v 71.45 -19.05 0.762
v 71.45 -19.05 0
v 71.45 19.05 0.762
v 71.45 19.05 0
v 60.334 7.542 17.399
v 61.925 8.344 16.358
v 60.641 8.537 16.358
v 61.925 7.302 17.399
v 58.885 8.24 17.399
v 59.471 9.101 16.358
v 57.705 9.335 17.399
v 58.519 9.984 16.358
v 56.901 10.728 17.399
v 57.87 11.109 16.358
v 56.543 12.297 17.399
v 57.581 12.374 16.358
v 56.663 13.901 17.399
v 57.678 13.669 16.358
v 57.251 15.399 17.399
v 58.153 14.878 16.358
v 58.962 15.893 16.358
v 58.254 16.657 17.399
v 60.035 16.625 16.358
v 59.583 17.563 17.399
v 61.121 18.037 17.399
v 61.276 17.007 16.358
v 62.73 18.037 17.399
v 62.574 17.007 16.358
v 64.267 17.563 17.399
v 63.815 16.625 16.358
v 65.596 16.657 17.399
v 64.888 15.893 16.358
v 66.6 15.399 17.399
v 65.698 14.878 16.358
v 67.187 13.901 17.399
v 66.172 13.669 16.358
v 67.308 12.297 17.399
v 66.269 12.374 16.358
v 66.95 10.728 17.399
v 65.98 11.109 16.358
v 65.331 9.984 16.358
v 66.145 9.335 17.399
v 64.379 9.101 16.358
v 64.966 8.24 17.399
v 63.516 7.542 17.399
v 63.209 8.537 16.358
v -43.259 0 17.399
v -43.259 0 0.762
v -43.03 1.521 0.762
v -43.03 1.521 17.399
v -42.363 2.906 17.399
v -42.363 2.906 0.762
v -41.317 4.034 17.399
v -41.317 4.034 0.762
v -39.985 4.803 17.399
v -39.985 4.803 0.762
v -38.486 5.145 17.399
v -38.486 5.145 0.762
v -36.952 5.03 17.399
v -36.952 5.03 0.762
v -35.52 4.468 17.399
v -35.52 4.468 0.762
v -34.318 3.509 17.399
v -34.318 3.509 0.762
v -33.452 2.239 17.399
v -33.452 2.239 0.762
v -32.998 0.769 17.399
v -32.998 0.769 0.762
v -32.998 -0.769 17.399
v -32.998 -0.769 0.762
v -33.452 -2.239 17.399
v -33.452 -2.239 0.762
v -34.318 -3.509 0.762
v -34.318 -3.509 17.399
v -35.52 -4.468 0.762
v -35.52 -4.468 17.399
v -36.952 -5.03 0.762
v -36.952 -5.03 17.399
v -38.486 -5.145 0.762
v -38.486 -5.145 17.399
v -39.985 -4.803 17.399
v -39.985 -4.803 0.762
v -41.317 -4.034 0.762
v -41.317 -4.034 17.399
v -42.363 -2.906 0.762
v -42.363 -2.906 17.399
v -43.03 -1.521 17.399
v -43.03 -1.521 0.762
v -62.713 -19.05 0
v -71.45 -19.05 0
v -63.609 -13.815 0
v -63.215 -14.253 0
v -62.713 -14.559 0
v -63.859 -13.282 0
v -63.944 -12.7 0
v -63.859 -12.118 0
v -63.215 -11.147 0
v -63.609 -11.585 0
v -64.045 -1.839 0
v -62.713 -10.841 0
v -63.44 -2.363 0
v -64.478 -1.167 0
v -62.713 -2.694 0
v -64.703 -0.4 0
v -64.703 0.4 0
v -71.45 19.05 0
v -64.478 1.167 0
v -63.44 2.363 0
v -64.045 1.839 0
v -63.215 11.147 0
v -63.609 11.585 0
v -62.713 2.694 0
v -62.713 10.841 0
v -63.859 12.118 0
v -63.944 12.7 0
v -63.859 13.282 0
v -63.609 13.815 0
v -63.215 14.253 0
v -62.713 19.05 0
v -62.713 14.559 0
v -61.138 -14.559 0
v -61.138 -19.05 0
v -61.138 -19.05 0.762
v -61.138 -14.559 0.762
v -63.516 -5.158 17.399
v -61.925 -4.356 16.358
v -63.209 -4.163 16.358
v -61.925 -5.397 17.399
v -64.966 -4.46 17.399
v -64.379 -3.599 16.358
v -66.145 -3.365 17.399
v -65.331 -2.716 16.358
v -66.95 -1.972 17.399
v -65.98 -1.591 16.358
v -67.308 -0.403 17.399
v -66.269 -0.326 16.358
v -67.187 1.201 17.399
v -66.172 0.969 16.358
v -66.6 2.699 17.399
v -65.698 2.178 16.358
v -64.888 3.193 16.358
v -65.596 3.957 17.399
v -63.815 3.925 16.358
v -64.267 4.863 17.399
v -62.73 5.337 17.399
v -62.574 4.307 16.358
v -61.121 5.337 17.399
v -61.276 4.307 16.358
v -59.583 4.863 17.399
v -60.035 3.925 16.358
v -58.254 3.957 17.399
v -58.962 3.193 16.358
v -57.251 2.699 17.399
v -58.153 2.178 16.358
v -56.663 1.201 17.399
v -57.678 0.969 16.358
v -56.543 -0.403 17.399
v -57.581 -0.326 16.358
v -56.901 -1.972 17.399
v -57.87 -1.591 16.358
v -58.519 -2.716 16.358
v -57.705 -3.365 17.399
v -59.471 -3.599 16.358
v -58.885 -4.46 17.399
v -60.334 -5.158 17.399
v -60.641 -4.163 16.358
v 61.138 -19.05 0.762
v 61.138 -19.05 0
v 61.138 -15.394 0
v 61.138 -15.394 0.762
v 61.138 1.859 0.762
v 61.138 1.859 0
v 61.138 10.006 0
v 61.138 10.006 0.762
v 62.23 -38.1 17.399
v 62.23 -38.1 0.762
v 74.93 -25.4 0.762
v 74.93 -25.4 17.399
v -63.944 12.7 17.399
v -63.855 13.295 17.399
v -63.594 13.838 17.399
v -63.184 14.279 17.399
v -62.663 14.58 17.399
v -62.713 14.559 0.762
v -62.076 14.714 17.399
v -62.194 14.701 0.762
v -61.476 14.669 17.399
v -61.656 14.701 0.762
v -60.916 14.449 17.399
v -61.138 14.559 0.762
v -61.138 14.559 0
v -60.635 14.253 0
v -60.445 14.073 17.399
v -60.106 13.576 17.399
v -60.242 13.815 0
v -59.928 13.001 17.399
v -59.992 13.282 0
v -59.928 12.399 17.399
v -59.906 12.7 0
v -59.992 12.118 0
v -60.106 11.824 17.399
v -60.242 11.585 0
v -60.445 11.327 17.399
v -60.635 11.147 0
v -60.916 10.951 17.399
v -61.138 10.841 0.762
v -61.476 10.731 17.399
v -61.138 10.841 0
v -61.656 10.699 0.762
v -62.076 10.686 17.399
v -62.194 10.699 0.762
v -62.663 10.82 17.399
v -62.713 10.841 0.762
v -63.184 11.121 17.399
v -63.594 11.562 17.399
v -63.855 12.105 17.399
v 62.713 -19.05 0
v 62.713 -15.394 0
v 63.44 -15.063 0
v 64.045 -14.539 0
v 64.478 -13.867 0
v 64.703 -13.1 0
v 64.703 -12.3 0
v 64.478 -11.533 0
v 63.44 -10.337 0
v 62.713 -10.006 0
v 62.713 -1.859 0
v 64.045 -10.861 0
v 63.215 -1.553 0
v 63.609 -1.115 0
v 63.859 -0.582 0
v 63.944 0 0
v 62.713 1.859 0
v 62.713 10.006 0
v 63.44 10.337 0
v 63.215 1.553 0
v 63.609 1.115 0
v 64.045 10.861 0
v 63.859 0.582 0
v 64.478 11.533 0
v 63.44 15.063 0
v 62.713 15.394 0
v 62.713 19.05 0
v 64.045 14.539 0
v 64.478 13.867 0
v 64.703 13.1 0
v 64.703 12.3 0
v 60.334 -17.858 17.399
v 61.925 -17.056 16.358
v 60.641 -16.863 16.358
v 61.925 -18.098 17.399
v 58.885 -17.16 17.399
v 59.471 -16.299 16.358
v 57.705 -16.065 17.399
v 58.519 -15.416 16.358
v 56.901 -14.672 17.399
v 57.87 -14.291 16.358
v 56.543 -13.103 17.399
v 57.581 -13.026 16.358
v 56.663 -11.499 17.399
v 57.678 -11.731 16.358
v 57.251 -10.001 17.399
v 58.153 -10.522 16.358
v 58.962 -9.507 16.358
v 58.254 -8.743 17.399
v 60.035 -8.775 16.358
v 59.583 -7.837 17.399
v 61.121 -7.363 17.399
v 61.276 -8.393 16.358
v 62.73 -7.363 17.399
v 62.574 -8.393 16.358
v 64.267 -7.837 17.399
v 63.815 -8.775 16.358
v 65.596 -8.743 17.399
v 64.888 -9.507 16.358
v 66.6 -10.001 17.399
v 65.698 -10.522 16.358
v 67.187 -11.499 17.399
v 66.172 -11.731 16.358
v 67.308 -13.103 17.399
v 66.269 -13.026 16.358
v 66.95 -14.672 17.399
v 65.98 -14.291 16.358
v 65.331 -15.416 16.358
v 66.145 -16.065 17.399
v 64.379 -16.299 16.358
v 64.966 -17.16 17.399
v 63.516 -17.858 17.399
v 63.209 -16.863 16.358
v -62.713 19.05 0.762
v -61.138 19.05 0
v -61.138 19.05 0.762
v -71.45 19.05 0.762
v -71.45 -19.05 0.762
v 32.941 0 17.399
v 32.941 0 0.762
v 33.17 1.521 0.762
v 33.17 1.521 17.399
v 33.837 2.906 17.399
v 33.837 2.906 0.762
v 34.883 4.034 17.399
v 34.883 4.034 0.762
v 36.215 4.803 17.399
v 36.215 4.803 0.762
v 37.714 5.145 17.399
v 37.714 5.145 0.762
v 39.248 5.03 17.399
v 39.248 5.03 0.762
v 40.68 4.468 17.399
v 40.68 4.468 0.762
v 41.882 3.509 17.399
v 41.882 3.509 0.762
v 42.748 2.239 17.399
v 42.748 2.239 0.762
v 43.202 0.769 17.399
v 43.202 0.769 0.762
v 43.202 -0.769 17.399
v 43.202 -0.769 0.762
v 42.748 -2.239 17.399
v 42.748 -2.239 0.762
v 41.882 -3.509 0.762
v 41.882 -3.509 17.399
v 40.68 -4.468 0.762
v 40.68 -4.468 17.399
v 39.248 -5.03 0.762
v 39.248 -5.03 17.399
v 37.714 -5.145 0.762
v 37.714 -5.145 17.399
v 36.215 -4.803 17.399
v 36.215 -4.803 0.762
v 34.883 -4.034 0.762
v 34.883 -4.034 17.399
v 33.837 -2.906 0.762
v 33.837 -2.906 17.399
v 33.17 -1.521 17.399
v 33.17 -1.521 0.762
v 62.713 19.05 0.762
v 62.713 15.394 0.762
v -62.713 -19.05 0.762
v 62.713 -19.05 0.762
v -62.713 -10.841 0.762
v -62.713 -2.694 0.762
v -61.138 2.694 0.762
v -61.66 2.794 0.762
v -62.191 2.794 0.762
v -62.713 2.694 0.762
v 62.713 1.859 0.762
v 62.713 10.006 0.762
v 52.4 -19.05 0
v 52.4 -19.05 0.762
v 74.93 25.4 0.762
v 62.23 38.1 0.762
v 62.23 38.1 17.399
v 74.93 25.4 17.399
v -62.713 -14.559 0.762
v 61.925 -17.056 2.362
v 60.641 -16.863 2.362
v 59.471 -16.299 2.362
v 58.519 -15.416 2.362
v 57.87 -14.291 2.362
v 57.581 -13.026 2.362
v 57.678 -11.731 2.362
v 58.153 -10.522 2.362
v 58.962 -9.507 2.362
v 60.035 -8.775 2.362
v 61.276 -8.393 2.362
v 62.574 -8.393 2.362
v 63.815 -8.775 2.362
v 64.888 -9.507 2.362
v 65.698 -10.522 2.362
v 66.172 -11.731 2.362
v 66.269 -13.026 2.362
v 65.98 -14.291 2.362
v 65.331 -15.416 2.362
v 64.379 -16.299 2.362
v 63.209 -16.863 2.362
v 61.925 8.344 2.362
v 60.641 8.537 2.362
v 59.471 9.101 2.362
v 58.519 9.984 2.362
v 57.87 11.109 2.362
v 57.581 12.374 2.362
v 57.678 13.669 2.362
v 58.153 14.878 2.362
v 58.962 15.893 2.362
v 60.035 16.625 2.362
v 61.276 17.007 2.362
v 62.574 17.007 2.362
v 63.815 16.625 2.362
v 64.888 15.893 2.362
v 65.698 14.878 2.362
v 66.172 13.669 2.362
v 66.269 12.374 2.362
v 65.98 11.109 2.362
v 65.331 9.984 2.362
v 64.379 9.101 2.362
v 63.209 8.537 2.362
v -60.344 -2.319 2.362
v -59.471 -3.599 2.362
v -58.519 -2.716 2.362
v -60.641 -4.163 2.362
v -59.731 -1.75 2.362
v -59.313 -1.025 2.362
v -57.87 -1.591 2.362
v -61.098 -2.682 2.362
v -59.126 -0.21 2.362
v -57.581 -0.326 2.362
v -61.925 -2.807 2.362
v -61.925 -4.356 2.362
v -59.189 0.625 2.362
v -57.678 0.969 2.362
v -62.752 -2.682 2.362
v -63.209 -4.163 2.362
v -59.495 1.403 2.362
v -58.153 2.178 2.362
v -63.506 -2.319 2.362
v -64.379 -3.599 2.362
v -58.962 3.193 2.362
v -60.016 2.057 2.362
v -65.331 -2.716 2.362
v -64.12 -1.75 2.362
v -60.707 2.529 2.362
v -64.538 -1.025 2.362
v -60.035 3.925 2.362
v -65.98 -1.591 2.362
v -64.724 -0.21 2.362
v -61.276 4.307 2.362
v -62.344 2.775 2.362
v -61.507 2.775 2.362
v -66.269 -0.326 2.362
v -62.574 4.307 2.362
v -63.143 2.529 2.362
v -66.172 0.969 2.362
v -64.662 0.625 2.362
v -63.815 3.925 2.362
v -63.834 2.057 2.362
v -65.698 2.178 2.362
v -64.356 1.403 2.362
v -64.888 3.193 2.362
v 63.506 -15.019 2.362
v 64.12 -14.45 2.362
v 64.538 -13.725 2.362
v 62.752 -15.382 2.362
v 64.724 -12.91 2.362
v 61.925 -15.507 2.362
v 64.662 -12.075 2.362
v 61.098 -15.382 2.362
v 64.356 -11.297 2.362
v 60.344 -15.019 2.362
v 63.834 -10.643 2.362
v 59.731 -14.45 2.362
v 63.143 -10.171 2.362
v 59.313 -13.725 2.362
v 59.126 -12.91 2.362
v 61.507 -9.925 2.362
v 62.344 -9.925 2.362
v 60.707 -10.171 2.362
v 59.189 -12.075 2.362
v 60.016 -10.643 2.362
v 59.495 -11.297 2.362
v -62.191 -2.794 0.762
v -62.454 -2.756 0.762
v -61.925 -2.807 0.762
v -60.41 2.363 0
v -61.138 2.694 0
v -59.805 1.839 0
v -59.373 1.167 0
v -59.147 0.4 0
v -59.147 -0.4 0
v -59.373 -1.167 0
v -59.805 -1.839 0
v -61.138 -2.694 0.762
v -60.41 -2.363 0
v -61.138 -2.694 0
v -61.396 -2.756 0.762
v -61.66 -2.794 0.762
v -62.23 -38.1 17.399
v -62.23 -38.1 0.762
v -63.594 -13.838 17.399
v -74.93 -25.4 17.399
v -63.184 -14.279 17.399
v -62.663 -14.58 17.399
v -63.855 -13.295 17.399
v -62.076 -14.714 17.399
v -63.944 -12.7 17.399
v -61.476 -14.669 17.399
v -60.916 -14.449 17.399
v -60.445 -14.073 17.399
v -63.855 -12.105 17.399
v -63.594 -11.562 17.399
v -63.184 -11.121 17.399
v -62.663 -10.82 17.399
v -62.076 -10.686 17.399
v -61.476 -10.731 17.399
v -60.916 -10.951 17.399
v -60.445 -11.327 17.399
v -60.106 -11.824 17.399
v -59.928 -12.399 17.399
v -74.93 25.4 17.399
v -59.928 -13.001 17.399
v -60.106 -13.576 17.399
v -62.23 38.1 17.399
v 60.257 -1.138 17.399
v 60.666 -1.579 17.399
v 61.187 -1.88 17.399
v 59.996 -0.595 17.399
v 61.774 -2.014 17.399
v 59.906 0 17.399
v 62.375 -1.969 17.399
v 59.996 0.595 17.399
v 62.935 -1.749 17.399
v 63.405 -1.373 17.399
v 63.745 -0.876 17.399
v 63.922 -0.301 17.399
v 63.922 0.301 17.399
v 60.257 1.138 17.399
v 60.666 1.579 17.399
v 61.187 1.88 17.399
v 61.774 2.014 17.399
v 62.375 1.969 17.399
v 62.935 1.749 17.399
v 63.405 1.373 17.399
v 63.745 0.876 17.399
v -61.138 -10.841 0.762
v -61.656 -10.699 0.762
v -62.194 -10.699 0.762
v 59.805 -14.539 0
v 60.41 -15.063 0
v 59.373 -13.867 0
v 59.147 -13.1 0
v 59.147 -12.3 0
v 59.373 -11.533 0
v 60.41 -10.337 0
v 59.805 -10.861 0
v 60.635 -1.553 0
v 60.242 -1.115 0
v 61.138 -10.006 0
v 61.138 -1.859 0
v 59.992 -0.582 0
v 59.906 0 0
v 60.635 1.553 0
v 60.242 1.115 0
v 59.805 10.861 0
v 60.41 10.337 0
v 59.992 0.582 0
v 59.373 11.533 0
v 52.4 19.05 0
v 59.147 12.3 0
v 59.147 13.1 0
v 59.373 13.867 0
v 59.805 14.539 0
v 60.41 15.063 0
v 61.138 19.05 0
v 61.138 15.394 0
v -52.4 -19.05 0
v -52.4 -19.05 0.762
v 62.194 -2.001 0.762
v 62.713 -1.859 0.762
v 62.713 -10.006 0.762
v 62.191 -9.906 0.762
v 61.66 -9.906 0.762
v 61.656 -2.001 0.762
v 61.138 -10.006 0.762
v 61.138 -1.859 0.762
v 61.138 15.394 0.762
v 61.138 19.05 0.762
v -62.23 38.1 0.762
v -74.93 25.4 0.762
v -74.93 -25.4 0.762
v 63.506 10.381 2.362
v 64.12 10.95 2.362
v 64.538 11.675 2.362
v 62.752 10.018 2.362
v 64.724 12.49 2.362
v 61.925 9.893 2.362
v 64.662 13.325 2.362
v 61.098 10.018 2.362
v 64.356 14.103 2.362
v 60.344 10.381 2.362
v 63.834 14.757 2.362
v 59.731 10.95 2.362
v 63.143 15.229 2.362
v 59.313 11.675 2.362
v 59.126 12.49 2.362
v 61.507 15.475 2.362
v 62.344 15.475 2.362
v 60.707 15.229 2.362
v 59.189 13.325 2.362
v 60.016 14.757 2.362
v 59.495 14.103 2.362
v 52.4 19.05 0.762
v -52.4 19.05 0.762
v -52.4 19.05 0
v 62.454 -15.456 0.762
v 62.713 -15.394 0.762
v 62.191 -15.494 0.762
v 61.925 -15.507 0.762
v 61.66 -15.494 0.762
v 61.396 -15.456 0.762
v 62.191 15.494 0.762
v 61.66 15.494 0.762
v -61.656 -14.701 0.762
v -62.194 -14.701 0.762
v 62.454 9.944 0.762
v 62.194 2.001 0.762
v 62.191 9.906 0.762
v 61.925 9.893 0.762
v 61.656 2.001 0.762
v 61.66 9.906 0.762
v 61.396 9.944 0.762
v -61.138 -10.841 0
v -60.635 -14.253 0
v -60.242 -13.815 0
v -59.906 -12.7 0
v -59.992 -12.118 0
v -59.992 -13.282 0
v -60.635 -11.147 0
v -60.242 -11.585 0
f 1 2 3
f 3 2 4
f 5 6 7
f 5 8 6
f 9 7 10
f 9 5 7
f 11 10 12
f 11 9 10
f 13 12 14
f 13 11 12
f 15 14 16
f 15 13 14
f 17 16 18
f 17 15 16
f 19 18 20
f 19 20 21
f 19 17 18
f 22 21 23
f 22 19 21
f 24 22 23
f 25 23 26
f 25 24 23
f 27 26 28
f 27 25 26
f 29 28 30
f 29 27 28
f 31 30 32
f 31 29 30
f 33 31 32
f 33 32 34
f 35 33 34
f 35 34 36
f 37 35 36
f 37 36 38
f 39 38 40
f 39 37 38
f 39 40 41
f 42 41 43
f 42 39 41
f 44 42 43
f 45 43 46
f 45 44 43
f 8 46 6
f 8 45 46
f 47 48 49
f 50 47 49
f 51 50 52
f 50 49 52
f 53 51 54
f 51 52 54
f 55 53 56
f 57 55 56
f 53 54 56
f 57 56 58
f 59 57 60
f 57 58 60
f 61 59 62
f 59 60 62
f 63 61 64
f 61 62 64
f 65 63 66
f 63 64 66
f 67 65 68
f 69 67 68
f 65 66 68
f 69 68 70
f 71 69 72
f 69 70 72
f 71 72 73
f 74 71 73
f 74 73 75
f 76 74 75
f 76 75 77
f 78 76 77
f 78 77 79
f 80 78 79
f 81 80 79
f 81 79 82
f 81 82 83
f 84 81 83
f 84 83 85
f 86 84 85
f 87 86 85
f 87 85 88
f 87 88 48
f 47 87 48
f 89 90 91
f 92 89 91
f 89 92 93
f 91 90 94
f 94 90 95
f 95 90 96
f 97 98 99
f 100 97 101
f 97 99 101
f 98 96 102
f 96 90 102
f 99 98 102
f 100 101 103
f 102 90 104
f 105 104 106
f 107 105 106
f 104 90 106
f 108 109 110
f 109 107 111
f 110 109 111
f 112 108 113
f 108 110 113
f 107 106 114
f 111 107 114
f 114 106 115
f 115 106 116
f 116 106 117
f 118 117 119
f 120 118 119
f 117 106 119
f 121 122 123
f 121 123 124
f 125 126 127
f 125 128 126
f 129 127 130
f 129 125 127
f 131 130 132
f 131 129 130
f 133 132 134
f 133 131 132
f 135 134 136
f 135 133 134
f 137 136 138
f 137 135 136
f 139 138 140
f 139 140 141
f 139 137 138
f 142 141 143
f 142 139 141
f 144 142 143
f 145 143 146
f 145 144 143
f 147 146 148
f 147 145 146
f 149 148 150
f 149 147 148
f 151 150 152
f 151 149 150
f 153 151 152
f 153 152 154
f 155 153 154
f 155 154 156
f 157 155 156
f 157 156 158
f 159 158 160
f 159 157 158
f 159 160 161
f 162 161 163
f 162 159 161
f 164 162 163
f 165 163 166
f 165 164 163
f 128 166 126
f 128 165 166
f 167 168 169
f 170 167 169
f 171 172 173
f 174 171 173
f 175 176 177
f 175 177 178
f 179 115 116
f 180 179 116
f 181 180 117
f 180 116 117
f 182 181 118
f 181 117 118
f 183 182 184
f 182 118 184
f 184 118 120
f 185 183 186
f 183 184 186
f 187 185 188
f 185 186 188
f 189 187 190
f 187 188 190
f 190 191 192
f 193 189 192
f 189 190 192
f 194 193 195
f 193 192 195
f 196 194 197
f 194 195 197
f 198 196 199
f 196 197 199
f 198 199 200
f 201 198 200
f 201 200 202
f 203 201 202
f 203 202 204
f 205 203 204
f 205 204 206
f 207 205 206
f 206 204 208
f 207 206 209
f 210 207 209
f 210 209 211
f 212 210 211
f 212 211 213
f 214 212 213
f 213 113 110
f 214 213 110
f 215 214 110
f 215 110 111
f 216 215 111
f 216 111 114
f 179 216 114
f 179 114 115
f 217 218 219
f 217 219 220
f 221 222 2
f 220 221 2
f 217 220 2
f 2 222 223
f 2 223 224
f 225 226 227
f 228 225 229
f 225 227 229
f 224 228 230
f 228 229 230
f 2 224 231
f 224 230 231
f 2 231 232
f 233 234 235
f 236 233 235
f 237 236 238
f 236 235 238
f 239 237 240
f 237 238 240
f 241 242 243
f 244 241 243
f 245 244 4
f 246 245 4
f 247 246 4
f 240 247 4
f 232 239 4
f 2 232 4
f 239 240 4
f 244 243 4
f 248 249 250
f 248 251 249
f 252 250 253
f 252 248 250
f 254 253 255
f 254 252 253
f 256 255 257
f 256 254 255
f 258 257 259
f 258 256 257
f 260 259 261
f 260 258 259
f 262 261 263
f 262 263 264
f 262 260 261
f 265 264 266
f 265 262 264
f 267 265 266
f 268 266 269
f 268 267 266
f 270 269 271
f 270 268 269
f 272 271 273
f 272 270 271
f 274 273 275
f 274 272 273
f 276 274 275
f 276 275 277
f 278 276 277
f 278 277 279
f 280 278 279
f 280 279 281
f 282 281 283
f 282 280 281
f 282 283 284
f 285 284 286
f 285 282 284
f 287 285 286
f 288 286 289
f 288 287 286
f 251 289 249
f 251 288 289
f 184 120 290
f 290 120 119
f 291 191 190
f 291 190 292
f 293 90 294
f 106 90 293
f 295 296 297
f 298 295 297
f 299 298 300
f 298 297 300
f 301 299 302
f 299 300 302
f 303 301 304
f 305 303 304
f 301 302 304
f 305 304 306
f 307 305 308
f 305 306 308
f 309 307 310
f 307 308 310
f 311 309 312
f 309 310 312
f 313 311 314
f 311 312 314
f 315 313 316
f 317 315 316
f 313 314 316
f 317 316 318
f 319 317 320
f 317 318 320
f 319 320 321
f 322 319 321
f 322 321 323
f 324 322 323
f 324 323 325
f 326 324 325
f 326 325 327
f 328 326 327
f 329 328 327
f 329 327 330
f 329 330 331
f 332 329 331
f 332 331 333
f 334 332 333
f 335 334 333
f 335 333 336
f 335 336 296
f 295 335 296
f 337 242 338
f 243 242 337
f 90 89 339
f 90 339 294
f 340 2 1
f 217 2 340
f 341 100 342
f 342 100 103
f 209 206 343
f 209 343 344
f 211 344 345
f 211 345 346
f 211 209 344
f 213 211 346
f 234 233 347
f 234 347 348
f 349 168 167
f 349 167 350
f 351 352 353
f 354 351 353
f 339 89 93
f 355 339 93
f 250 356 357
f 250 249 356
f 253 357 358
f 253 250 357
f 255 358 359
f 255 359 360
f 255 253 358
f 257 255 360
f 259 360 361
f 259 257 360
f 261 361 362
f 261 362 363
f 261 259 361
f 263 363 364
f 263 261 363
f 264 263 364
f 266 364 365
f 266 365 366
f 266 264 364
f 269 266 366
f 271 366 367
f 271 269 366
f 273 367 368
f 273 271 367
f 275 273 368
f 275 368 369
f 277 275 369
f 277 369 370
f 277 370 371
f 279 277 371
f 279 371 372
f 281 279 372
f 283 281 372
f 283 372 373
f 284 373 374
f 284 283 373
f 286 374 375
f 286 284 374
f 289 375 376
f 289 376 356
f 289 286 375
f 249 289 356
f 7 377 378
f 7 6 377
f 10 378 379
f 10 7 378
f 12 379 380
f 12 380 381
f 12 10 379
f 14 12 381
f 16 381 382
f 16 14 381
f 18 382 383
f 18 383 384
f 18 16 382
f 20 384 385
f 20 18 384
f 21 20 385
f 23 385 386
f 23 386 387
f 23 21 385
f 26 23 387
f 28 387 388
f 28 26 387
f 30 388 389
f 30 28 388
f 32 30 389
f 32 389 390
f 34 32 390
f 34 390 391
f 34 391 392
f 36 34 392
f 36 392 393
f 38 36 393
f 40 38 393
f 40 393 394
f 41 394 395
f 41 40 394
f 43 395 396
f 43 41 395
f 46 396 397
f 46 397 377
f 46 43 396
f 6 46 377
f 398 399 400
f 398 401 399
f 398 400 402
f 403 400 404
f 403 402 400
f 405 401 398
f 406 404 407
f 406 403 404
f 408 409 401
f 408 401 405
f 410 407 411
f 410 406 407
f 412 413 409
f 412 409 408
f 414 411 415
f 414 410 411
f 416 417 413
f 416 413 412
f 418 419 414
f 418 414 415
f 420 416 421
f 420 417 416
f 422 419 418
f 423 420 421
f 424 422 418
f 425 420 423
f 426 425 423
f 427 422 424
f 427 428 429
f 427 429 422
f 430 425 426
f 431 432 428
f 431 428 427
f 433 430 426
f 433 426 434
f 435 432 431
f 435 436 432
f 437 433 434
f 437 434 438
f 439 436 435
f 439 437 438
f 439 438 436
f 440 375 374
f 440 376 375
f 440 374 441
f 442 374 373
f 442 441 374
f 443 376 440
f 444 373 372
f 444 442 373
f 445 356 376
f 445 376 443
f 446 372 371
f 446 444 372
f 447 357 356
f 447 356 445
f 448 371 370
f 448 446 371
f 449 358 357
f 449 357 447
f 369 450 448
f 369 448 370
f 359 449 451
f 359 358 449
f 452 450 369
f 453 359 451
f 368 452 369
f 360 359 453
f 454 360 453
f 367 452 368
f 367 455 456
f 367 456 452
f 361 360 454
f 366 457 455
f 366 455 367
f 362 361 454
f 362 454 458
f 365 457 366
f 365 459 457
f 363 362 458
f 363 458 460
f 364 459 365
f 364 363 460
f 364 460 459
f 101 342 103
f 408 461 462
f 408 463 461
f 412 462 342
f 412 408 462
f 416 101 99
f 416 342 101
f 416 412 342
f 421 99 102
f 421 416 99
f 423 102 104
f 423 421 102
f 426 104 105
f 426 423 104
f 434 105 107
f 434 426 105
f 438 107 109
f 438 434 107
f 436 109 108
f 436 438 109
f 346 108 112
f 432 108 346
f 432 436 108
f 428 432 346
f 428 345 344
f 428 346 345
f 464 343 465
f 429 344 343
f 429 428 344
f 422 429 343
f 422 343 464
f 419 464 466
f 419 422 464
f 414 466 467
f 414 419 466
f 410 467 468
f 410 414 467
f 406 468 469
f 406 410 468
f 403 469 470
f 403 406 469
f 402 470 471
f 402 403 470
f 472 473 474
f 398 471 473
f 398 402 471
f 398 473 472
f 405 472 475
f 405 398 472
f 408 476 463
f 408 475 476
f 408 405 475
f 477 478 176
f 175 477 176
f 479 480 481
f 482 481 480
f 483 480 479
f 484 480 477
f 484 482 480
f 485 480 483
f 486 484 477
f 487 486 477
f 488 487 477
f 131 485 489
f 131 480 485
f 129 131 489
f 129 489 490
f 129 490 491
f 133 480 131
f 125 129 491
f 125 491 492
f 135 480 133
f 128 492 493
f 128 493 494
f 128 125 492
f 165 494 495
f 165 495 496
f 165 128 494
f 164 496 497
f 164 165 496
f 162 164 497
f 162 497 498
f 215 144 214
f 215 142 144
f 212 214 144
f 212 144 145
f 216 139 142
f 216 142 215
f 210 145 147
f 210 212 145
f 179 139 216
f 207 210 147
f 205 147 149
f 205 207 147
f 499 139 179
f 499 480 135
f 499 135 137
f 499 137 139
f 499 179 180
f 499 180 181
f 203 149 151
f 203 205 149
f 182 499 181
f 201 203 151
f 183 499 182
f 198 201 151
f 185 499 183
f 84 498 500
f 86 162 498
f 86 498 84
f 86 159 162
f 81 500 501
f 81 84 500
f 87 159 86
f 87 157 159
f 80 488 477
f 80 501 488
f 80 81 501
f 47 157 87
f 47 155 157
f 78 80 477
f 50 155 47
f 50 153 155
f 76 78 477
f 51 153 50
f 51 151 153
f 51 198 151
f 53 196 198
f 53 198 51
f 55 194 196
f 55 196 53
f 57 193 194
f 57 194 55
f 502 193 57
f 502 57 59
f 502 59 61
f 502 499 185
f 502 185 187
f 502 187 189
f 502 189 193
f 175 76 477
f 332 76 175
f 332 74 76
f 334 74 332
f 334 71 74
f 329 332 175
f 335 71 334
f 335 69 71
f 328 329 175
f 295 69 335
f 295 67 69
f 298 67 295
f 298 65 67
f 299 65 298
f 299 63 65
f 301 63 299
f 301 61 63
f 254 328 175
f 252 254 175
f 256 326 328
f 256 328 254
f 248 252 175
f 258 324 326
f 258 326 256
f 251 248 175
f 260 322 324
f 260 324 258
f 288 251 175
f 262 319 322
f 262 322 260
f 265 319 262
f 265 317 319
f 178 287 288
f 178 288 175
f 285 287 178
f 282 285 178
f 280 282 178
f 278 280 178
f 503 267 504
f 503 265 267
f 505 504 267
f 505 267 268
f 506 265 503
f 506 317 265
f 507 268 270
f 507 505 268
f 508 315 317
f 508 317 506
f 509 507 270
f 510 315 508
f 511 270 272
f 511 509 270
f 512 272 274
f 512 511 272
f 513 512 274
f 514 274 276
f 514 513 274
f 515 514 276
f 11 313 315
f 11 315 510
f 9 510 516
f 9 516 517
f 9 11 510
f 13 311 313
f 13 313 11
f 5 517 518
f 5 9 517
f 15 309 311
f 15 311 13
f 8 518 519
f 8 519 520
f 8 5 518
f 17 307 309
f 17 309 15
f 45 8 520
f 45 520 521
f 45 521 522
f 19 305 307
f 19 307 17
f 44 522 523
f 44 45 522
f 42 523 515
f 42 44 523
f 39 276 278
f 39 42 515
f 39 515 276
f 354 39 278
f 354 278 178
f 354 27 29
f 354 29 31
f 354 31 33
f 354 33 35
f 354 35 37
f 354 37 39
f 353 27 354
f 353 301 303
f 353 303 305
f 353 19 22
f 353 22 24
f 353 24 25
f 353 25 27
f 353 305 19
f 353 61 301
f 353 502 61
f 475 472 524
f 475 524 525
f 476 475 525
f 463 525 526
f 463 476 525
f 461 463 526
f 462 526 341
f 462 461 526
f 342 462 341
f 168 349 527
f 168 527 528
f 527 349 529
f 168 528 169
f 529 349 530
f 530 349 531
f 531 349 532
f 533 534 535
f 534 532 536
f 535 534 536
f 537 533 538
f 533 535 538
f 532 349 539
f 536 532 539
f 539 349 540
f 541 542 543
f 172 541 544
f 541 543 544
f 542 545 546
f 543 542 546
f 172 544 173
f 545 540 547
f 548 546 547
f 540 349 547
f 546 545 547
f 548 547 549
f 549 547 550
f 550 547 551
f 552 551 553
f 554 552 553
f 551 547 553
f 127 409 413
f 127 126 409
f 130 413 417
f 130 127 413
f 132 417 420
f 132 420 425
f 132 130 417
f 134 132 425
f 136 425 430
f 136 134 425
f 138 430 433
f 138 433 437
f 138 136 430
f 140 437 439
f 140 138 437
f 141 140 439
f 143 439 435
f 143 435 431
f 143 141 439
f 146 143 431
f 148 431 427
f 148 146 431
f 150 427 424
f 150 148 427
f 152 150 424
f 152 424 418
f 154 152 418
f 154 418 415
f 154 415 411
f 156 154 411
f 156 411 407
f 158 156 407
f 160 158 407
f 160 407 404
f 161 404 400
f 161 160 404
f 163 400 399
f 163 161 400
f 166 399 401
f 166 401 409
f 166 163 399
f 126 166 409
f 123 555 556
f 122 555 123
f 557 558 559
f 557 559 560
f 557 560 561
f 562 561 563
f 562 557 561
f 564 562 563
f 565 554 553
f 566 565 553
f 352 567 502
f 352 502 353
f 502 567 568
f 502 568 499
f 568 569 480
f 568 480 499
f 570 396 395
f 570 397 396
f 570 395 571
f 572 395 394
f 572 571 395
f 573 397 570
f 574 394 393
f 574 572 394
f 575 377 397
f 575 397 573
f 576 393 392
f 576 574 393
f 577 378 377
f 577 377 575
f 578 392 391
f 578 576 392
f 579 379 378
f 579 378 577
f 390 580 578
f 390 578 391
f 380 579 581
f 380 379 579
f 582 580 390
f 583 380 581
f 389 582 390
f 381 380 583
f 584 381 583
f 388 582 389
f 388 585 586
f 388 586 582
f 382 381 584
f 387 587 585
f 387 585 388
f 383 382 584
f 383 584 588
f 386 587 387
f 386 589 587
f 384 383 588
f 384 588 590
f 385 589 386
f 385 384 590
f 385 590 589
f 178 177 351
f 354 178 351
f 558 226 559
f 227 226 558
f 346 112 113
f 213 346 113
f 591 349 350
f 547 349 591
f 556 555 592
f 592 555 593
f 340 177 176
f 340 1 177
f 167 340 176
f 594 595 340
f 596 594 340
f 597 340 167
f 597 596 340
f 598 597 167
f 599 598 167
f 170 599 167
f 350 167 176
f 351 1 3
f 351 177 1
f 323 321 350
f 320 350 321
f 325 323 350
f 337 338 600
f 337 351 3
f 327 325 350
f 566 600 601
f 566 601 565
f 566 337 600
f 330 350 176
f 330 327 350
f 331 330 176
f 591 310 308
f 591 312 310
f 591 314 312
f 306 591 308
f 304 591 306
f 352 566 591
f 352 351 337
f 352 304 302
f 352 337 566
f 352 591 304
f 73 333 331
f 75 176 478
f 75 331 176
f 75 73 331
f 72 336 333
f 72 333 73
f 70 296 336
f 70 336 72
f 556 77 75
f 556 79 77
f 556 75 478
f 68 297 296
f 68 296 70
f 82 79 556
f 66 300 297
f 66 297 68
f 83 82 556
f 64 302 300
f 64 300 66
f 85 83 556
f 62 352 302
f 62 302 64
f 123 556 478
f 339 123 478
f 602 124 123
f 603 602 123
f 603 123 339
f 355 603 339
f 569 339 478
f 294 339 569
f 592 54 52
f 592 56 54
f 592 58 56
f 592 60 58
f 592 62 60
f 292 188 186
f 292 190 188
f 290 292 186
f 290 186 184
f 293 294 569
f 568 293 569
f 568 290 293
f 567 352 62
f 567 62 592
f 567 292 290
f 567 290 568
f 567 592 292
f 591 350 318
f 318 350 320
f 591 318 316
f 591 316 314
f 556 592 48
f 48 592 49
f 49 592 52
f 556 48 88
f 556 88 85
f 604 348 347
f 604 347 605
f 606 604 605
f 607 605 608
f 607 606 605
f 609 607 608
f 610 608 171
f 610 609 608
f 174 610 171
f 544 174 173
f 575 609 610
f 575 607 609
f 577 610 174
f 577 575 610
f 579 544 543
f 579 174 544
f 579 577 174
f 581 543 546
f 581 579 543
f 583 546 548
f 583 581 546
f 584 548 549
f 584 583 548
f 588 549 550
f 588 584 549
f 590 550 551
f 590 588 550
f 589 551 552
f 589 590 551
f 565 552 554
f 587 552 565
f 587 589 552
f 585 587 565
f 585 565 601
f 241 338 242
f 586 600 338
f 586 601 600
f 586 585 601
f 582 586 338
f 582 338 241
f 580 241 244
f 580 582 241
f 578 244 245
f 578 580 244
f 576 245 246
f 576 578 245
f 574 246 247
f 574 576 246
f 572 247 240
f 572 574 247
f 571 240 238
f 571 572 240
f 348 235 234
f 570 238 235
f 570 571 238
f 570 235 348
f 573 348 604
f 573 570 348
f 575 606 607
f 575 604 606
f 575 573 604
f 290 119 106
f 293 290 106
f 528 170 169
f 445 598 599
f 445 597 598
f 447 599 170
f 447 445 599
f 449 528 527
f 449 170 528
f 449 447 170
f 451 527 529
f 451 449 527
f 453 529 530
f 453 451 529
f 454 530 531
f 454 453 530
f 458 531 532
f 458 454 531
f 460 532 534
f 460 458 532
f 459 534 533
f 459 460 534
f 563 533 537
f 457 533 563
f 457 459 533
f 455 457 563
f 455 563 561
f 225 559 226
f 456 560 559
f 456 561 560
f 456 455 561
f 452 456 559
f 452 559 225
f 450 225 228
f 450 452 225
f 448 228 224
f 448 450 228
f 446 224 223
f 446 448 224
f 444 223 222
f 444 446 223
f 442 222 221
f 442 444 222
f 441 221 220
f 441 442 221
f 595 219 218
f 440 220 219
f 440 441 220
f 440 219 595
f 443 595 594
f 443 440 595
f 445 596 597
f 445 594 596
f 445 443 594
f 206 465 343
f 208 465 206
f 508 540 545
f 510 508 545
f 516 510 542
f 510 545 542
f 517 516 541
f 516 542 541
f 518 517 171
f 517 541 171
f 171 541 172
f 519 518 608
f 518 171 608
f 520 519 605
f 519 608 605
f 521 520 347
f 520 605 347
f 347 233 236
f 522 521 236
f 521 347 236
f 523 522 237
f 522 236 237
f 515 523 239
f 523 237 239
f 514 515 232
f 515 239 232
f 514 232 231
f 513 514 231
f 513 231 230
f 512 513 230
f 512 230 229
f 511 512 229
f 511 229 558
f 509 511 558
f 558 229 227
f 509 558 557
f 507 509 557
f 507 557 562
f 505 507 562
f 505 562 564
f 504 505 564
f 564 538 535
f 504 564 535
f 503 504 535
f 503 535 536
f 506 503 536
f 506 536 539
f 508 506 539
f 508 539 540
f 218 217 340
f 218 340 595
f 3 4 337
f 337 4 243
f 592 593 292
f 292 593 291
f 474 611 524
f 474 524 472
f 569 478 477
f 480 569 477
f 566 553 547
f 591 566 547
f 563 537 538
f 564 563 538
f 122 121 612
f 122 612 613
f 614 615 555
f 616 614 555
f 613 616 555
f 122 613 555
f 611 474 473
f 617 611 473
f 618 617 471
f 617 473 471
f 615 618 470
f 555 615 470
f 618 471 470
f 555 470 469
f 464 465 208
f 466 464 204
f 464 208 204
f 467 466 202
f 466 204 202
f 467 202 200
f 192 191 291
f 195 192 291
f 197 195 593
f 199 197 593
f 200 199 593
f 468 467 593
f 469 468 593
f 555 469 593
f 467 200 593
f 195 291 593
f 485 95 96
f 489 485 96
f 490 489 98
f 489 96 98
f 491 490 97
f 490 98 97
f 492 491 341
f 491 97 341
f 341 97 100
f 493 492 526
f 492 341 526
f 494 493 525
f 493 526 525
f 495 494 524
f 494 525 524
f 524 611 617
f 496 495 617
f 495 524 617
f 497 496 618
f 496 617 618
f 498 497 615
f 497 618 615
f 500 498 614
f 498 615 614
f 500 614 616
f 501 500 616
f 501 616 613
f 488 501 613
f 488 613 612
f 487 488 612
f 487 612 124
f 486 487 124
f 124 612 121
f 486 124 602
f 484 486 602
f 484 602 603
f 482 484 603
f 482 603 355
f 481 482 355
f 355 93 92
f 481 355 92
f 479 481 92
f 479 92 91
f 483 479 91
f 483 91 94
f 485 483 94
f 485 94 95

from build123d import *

# Parameters (mm, degrees)
SKETCH1_W                                    = 149.86
SKETCH1_H                                    = 76.2
EXTRUDE1_DEPTH                               = 17.399
SKETCH2_W                                    = 149.86
SKETCH2_H                                    = 76.2
SKETCH2_W_2                                  = 19.05
SKETCH2_H_2                                  = 38.1
CUT_EXTRUDE1_DEPTH                           = 0.762
F_10_32_TAPPED_HOLE1_D                       = 4.0386
CBORE_FOR_10_SOCKET_HEAD_CAP_SCREW1_AT_COUNT = 2
CBORE_FOR_10_SOCKET_HEAD_CAP_SCREW1_AT_PITCH = 25.4
CBORE_FOR_10_SOCKET_HEAD_CAP_SCREW1_2_COUNT  = 2
CBORE_FOR_10_SOCKET_HEAD_CAP_SCREW1_2_PITCH  = 124.499845703
CHAMFER1_SIZE                                = 12.7
SKETCH7_W                                    = 1.5748
SKETCH7_H                                    = 38.1
CUT_EXTRUDE2_DEPTH                           = 0.762
F_13_32_0_40625_DIAMETER_HOLE1_D             = 10.31875


with BuildPart() as part:
    # Sketch1 → Extrude1 (new body)
    with BuildSketch(Plane.XY):
        Rectangle(SKETCH1_W, SKETCH1_H)
    extrude(amount=EXTRUDE1_DEPTH)

    # Sketch2 → Cut-Extrude1 (cut)
    with BuildSketch(Plane(origin=(0, 0, 0), x_dir=(-1, 0, 0), z_dir=(0, 0, -1))):
        Rectangle(SKETCH2_W, SKETCH2_H)
        with Locations((-61.9252, 0)):
            Rectangle(SKETCH2_W_2, SKETCH2_H_2, mode=Mode.SUBTRACT)
        with Locations((61.9252, 0)):
            Rectangle(SKETCH2_W_2, SKETCH2_H_2, mode=Mode.SUBTRACT)
    extrude(amount=-CUT_EXTRUDE1_DEPTH, mode=Mode.SUBTRACT)

    # #10-32 Tapped Hole1 (through all)
    with Locations(Plane.XY.offset(17.399)):
        with Locations((61.9252, 0), (-61.9252, -12.7), (-61.9252, 12.7)):
            Hole(F_10_32_TAPPED_HOLE1_D / 2)

    # Sketch5 → CBORE for #10 Socket Head Cap Screw1 (revolve, cut)
    with BuildSketch(Plane(origin=(61.9252, -12.7, 17.399), x_dir=(0, -1, 0), z_dir=(1, 0, 0))):
        Polygon((0, 0), (0, 17.399), (2.8067, 17.399), (2.8067, 15.0368), (4.3561, 15.0368), (4.3561, 1.0414), (5.3975, 0), align=None)
    cbore_for_10_socket_head_cap_screw1 = revolve(axis=Axis((61.9252, -12.7, 23.749), (0, 0, -1)), mode=Mode.SUBTRACT)

    # CBORE for #10 Socket Head Cap Screw1 at: CBORE for #10 Socket Head Cap Screw1 ×2
    with Locations(*[(0, i * CBORE_FOR_10_SOCKET_HEAD_CAP_SCREW1_AT_PITCH, 0) for i in range(1, CBORE_FOR_10_SOCKET_HEAD_CAP_SCREW1_AT_COUNT)]):
        add(cbore_for_10_socket_head_cap_screw1, mode=Mode.SUBTRACT)

    # CBORE for _10 Socket Head Cap Screw1 2: CBORE for #10 Socket Head Cap Screw1 ×2
    with Locations(*[Vector(-0.994783562, 0.102008159, 0) * (i * CBORE_FOR_10_SOCKET_HEAD_CAP_SCREW1_2_PITCH) for i in range(1, CBORE_FOR_10_SOCKET_HEAD_CAP_SCREW1_2_COUNT)]):
        add(cbore_for_10_socket_head_cap_screw1, mode=Mode.SUBTRACT)

    # Chamfer1
    chamfer1_edges = [part.edges().sort_by_distance(p)[0] for p in [
        (74.93, -38.1, 9.0805),
        (-74.93, -38.1, 9.0805),
        (-74.93, 38.1, 9.0805),
        (74.93, 38.1, 9.0805),
    ]]
    chamfer(chamfer1_edges, length=CHAMFER1_SIZE)

    # Sketch7 → Cut-Extrude2 (cut)
    with BuildSketch(Plane(origin=(0, 0, 0), x_dir=(-1, 0, 0), z_dir=(0, 0, -1))):
        with Locations((61.9252, 0)):
            Rectangle(SKETCH7_W, SKETCH7_H)
        with Locations((-61.9252, 0)):
            Rectangle(SKETCH7_W, SKETCH7_H)
    extrude(amount=-CUT_EXTRUDE2_DEPTH, mode=Mode.SUBTRACT)

    # 13/32 (0.40625) Diameter Hole1 (through all)
    with Locations(Plane.XY.offset(17.399)):
        with Locations((-38.1, 0), (38.1, 0)):
            Hole(F_13_32_0_40625_DIAMETER_HOLE1_D / 2)


solid = part.part
